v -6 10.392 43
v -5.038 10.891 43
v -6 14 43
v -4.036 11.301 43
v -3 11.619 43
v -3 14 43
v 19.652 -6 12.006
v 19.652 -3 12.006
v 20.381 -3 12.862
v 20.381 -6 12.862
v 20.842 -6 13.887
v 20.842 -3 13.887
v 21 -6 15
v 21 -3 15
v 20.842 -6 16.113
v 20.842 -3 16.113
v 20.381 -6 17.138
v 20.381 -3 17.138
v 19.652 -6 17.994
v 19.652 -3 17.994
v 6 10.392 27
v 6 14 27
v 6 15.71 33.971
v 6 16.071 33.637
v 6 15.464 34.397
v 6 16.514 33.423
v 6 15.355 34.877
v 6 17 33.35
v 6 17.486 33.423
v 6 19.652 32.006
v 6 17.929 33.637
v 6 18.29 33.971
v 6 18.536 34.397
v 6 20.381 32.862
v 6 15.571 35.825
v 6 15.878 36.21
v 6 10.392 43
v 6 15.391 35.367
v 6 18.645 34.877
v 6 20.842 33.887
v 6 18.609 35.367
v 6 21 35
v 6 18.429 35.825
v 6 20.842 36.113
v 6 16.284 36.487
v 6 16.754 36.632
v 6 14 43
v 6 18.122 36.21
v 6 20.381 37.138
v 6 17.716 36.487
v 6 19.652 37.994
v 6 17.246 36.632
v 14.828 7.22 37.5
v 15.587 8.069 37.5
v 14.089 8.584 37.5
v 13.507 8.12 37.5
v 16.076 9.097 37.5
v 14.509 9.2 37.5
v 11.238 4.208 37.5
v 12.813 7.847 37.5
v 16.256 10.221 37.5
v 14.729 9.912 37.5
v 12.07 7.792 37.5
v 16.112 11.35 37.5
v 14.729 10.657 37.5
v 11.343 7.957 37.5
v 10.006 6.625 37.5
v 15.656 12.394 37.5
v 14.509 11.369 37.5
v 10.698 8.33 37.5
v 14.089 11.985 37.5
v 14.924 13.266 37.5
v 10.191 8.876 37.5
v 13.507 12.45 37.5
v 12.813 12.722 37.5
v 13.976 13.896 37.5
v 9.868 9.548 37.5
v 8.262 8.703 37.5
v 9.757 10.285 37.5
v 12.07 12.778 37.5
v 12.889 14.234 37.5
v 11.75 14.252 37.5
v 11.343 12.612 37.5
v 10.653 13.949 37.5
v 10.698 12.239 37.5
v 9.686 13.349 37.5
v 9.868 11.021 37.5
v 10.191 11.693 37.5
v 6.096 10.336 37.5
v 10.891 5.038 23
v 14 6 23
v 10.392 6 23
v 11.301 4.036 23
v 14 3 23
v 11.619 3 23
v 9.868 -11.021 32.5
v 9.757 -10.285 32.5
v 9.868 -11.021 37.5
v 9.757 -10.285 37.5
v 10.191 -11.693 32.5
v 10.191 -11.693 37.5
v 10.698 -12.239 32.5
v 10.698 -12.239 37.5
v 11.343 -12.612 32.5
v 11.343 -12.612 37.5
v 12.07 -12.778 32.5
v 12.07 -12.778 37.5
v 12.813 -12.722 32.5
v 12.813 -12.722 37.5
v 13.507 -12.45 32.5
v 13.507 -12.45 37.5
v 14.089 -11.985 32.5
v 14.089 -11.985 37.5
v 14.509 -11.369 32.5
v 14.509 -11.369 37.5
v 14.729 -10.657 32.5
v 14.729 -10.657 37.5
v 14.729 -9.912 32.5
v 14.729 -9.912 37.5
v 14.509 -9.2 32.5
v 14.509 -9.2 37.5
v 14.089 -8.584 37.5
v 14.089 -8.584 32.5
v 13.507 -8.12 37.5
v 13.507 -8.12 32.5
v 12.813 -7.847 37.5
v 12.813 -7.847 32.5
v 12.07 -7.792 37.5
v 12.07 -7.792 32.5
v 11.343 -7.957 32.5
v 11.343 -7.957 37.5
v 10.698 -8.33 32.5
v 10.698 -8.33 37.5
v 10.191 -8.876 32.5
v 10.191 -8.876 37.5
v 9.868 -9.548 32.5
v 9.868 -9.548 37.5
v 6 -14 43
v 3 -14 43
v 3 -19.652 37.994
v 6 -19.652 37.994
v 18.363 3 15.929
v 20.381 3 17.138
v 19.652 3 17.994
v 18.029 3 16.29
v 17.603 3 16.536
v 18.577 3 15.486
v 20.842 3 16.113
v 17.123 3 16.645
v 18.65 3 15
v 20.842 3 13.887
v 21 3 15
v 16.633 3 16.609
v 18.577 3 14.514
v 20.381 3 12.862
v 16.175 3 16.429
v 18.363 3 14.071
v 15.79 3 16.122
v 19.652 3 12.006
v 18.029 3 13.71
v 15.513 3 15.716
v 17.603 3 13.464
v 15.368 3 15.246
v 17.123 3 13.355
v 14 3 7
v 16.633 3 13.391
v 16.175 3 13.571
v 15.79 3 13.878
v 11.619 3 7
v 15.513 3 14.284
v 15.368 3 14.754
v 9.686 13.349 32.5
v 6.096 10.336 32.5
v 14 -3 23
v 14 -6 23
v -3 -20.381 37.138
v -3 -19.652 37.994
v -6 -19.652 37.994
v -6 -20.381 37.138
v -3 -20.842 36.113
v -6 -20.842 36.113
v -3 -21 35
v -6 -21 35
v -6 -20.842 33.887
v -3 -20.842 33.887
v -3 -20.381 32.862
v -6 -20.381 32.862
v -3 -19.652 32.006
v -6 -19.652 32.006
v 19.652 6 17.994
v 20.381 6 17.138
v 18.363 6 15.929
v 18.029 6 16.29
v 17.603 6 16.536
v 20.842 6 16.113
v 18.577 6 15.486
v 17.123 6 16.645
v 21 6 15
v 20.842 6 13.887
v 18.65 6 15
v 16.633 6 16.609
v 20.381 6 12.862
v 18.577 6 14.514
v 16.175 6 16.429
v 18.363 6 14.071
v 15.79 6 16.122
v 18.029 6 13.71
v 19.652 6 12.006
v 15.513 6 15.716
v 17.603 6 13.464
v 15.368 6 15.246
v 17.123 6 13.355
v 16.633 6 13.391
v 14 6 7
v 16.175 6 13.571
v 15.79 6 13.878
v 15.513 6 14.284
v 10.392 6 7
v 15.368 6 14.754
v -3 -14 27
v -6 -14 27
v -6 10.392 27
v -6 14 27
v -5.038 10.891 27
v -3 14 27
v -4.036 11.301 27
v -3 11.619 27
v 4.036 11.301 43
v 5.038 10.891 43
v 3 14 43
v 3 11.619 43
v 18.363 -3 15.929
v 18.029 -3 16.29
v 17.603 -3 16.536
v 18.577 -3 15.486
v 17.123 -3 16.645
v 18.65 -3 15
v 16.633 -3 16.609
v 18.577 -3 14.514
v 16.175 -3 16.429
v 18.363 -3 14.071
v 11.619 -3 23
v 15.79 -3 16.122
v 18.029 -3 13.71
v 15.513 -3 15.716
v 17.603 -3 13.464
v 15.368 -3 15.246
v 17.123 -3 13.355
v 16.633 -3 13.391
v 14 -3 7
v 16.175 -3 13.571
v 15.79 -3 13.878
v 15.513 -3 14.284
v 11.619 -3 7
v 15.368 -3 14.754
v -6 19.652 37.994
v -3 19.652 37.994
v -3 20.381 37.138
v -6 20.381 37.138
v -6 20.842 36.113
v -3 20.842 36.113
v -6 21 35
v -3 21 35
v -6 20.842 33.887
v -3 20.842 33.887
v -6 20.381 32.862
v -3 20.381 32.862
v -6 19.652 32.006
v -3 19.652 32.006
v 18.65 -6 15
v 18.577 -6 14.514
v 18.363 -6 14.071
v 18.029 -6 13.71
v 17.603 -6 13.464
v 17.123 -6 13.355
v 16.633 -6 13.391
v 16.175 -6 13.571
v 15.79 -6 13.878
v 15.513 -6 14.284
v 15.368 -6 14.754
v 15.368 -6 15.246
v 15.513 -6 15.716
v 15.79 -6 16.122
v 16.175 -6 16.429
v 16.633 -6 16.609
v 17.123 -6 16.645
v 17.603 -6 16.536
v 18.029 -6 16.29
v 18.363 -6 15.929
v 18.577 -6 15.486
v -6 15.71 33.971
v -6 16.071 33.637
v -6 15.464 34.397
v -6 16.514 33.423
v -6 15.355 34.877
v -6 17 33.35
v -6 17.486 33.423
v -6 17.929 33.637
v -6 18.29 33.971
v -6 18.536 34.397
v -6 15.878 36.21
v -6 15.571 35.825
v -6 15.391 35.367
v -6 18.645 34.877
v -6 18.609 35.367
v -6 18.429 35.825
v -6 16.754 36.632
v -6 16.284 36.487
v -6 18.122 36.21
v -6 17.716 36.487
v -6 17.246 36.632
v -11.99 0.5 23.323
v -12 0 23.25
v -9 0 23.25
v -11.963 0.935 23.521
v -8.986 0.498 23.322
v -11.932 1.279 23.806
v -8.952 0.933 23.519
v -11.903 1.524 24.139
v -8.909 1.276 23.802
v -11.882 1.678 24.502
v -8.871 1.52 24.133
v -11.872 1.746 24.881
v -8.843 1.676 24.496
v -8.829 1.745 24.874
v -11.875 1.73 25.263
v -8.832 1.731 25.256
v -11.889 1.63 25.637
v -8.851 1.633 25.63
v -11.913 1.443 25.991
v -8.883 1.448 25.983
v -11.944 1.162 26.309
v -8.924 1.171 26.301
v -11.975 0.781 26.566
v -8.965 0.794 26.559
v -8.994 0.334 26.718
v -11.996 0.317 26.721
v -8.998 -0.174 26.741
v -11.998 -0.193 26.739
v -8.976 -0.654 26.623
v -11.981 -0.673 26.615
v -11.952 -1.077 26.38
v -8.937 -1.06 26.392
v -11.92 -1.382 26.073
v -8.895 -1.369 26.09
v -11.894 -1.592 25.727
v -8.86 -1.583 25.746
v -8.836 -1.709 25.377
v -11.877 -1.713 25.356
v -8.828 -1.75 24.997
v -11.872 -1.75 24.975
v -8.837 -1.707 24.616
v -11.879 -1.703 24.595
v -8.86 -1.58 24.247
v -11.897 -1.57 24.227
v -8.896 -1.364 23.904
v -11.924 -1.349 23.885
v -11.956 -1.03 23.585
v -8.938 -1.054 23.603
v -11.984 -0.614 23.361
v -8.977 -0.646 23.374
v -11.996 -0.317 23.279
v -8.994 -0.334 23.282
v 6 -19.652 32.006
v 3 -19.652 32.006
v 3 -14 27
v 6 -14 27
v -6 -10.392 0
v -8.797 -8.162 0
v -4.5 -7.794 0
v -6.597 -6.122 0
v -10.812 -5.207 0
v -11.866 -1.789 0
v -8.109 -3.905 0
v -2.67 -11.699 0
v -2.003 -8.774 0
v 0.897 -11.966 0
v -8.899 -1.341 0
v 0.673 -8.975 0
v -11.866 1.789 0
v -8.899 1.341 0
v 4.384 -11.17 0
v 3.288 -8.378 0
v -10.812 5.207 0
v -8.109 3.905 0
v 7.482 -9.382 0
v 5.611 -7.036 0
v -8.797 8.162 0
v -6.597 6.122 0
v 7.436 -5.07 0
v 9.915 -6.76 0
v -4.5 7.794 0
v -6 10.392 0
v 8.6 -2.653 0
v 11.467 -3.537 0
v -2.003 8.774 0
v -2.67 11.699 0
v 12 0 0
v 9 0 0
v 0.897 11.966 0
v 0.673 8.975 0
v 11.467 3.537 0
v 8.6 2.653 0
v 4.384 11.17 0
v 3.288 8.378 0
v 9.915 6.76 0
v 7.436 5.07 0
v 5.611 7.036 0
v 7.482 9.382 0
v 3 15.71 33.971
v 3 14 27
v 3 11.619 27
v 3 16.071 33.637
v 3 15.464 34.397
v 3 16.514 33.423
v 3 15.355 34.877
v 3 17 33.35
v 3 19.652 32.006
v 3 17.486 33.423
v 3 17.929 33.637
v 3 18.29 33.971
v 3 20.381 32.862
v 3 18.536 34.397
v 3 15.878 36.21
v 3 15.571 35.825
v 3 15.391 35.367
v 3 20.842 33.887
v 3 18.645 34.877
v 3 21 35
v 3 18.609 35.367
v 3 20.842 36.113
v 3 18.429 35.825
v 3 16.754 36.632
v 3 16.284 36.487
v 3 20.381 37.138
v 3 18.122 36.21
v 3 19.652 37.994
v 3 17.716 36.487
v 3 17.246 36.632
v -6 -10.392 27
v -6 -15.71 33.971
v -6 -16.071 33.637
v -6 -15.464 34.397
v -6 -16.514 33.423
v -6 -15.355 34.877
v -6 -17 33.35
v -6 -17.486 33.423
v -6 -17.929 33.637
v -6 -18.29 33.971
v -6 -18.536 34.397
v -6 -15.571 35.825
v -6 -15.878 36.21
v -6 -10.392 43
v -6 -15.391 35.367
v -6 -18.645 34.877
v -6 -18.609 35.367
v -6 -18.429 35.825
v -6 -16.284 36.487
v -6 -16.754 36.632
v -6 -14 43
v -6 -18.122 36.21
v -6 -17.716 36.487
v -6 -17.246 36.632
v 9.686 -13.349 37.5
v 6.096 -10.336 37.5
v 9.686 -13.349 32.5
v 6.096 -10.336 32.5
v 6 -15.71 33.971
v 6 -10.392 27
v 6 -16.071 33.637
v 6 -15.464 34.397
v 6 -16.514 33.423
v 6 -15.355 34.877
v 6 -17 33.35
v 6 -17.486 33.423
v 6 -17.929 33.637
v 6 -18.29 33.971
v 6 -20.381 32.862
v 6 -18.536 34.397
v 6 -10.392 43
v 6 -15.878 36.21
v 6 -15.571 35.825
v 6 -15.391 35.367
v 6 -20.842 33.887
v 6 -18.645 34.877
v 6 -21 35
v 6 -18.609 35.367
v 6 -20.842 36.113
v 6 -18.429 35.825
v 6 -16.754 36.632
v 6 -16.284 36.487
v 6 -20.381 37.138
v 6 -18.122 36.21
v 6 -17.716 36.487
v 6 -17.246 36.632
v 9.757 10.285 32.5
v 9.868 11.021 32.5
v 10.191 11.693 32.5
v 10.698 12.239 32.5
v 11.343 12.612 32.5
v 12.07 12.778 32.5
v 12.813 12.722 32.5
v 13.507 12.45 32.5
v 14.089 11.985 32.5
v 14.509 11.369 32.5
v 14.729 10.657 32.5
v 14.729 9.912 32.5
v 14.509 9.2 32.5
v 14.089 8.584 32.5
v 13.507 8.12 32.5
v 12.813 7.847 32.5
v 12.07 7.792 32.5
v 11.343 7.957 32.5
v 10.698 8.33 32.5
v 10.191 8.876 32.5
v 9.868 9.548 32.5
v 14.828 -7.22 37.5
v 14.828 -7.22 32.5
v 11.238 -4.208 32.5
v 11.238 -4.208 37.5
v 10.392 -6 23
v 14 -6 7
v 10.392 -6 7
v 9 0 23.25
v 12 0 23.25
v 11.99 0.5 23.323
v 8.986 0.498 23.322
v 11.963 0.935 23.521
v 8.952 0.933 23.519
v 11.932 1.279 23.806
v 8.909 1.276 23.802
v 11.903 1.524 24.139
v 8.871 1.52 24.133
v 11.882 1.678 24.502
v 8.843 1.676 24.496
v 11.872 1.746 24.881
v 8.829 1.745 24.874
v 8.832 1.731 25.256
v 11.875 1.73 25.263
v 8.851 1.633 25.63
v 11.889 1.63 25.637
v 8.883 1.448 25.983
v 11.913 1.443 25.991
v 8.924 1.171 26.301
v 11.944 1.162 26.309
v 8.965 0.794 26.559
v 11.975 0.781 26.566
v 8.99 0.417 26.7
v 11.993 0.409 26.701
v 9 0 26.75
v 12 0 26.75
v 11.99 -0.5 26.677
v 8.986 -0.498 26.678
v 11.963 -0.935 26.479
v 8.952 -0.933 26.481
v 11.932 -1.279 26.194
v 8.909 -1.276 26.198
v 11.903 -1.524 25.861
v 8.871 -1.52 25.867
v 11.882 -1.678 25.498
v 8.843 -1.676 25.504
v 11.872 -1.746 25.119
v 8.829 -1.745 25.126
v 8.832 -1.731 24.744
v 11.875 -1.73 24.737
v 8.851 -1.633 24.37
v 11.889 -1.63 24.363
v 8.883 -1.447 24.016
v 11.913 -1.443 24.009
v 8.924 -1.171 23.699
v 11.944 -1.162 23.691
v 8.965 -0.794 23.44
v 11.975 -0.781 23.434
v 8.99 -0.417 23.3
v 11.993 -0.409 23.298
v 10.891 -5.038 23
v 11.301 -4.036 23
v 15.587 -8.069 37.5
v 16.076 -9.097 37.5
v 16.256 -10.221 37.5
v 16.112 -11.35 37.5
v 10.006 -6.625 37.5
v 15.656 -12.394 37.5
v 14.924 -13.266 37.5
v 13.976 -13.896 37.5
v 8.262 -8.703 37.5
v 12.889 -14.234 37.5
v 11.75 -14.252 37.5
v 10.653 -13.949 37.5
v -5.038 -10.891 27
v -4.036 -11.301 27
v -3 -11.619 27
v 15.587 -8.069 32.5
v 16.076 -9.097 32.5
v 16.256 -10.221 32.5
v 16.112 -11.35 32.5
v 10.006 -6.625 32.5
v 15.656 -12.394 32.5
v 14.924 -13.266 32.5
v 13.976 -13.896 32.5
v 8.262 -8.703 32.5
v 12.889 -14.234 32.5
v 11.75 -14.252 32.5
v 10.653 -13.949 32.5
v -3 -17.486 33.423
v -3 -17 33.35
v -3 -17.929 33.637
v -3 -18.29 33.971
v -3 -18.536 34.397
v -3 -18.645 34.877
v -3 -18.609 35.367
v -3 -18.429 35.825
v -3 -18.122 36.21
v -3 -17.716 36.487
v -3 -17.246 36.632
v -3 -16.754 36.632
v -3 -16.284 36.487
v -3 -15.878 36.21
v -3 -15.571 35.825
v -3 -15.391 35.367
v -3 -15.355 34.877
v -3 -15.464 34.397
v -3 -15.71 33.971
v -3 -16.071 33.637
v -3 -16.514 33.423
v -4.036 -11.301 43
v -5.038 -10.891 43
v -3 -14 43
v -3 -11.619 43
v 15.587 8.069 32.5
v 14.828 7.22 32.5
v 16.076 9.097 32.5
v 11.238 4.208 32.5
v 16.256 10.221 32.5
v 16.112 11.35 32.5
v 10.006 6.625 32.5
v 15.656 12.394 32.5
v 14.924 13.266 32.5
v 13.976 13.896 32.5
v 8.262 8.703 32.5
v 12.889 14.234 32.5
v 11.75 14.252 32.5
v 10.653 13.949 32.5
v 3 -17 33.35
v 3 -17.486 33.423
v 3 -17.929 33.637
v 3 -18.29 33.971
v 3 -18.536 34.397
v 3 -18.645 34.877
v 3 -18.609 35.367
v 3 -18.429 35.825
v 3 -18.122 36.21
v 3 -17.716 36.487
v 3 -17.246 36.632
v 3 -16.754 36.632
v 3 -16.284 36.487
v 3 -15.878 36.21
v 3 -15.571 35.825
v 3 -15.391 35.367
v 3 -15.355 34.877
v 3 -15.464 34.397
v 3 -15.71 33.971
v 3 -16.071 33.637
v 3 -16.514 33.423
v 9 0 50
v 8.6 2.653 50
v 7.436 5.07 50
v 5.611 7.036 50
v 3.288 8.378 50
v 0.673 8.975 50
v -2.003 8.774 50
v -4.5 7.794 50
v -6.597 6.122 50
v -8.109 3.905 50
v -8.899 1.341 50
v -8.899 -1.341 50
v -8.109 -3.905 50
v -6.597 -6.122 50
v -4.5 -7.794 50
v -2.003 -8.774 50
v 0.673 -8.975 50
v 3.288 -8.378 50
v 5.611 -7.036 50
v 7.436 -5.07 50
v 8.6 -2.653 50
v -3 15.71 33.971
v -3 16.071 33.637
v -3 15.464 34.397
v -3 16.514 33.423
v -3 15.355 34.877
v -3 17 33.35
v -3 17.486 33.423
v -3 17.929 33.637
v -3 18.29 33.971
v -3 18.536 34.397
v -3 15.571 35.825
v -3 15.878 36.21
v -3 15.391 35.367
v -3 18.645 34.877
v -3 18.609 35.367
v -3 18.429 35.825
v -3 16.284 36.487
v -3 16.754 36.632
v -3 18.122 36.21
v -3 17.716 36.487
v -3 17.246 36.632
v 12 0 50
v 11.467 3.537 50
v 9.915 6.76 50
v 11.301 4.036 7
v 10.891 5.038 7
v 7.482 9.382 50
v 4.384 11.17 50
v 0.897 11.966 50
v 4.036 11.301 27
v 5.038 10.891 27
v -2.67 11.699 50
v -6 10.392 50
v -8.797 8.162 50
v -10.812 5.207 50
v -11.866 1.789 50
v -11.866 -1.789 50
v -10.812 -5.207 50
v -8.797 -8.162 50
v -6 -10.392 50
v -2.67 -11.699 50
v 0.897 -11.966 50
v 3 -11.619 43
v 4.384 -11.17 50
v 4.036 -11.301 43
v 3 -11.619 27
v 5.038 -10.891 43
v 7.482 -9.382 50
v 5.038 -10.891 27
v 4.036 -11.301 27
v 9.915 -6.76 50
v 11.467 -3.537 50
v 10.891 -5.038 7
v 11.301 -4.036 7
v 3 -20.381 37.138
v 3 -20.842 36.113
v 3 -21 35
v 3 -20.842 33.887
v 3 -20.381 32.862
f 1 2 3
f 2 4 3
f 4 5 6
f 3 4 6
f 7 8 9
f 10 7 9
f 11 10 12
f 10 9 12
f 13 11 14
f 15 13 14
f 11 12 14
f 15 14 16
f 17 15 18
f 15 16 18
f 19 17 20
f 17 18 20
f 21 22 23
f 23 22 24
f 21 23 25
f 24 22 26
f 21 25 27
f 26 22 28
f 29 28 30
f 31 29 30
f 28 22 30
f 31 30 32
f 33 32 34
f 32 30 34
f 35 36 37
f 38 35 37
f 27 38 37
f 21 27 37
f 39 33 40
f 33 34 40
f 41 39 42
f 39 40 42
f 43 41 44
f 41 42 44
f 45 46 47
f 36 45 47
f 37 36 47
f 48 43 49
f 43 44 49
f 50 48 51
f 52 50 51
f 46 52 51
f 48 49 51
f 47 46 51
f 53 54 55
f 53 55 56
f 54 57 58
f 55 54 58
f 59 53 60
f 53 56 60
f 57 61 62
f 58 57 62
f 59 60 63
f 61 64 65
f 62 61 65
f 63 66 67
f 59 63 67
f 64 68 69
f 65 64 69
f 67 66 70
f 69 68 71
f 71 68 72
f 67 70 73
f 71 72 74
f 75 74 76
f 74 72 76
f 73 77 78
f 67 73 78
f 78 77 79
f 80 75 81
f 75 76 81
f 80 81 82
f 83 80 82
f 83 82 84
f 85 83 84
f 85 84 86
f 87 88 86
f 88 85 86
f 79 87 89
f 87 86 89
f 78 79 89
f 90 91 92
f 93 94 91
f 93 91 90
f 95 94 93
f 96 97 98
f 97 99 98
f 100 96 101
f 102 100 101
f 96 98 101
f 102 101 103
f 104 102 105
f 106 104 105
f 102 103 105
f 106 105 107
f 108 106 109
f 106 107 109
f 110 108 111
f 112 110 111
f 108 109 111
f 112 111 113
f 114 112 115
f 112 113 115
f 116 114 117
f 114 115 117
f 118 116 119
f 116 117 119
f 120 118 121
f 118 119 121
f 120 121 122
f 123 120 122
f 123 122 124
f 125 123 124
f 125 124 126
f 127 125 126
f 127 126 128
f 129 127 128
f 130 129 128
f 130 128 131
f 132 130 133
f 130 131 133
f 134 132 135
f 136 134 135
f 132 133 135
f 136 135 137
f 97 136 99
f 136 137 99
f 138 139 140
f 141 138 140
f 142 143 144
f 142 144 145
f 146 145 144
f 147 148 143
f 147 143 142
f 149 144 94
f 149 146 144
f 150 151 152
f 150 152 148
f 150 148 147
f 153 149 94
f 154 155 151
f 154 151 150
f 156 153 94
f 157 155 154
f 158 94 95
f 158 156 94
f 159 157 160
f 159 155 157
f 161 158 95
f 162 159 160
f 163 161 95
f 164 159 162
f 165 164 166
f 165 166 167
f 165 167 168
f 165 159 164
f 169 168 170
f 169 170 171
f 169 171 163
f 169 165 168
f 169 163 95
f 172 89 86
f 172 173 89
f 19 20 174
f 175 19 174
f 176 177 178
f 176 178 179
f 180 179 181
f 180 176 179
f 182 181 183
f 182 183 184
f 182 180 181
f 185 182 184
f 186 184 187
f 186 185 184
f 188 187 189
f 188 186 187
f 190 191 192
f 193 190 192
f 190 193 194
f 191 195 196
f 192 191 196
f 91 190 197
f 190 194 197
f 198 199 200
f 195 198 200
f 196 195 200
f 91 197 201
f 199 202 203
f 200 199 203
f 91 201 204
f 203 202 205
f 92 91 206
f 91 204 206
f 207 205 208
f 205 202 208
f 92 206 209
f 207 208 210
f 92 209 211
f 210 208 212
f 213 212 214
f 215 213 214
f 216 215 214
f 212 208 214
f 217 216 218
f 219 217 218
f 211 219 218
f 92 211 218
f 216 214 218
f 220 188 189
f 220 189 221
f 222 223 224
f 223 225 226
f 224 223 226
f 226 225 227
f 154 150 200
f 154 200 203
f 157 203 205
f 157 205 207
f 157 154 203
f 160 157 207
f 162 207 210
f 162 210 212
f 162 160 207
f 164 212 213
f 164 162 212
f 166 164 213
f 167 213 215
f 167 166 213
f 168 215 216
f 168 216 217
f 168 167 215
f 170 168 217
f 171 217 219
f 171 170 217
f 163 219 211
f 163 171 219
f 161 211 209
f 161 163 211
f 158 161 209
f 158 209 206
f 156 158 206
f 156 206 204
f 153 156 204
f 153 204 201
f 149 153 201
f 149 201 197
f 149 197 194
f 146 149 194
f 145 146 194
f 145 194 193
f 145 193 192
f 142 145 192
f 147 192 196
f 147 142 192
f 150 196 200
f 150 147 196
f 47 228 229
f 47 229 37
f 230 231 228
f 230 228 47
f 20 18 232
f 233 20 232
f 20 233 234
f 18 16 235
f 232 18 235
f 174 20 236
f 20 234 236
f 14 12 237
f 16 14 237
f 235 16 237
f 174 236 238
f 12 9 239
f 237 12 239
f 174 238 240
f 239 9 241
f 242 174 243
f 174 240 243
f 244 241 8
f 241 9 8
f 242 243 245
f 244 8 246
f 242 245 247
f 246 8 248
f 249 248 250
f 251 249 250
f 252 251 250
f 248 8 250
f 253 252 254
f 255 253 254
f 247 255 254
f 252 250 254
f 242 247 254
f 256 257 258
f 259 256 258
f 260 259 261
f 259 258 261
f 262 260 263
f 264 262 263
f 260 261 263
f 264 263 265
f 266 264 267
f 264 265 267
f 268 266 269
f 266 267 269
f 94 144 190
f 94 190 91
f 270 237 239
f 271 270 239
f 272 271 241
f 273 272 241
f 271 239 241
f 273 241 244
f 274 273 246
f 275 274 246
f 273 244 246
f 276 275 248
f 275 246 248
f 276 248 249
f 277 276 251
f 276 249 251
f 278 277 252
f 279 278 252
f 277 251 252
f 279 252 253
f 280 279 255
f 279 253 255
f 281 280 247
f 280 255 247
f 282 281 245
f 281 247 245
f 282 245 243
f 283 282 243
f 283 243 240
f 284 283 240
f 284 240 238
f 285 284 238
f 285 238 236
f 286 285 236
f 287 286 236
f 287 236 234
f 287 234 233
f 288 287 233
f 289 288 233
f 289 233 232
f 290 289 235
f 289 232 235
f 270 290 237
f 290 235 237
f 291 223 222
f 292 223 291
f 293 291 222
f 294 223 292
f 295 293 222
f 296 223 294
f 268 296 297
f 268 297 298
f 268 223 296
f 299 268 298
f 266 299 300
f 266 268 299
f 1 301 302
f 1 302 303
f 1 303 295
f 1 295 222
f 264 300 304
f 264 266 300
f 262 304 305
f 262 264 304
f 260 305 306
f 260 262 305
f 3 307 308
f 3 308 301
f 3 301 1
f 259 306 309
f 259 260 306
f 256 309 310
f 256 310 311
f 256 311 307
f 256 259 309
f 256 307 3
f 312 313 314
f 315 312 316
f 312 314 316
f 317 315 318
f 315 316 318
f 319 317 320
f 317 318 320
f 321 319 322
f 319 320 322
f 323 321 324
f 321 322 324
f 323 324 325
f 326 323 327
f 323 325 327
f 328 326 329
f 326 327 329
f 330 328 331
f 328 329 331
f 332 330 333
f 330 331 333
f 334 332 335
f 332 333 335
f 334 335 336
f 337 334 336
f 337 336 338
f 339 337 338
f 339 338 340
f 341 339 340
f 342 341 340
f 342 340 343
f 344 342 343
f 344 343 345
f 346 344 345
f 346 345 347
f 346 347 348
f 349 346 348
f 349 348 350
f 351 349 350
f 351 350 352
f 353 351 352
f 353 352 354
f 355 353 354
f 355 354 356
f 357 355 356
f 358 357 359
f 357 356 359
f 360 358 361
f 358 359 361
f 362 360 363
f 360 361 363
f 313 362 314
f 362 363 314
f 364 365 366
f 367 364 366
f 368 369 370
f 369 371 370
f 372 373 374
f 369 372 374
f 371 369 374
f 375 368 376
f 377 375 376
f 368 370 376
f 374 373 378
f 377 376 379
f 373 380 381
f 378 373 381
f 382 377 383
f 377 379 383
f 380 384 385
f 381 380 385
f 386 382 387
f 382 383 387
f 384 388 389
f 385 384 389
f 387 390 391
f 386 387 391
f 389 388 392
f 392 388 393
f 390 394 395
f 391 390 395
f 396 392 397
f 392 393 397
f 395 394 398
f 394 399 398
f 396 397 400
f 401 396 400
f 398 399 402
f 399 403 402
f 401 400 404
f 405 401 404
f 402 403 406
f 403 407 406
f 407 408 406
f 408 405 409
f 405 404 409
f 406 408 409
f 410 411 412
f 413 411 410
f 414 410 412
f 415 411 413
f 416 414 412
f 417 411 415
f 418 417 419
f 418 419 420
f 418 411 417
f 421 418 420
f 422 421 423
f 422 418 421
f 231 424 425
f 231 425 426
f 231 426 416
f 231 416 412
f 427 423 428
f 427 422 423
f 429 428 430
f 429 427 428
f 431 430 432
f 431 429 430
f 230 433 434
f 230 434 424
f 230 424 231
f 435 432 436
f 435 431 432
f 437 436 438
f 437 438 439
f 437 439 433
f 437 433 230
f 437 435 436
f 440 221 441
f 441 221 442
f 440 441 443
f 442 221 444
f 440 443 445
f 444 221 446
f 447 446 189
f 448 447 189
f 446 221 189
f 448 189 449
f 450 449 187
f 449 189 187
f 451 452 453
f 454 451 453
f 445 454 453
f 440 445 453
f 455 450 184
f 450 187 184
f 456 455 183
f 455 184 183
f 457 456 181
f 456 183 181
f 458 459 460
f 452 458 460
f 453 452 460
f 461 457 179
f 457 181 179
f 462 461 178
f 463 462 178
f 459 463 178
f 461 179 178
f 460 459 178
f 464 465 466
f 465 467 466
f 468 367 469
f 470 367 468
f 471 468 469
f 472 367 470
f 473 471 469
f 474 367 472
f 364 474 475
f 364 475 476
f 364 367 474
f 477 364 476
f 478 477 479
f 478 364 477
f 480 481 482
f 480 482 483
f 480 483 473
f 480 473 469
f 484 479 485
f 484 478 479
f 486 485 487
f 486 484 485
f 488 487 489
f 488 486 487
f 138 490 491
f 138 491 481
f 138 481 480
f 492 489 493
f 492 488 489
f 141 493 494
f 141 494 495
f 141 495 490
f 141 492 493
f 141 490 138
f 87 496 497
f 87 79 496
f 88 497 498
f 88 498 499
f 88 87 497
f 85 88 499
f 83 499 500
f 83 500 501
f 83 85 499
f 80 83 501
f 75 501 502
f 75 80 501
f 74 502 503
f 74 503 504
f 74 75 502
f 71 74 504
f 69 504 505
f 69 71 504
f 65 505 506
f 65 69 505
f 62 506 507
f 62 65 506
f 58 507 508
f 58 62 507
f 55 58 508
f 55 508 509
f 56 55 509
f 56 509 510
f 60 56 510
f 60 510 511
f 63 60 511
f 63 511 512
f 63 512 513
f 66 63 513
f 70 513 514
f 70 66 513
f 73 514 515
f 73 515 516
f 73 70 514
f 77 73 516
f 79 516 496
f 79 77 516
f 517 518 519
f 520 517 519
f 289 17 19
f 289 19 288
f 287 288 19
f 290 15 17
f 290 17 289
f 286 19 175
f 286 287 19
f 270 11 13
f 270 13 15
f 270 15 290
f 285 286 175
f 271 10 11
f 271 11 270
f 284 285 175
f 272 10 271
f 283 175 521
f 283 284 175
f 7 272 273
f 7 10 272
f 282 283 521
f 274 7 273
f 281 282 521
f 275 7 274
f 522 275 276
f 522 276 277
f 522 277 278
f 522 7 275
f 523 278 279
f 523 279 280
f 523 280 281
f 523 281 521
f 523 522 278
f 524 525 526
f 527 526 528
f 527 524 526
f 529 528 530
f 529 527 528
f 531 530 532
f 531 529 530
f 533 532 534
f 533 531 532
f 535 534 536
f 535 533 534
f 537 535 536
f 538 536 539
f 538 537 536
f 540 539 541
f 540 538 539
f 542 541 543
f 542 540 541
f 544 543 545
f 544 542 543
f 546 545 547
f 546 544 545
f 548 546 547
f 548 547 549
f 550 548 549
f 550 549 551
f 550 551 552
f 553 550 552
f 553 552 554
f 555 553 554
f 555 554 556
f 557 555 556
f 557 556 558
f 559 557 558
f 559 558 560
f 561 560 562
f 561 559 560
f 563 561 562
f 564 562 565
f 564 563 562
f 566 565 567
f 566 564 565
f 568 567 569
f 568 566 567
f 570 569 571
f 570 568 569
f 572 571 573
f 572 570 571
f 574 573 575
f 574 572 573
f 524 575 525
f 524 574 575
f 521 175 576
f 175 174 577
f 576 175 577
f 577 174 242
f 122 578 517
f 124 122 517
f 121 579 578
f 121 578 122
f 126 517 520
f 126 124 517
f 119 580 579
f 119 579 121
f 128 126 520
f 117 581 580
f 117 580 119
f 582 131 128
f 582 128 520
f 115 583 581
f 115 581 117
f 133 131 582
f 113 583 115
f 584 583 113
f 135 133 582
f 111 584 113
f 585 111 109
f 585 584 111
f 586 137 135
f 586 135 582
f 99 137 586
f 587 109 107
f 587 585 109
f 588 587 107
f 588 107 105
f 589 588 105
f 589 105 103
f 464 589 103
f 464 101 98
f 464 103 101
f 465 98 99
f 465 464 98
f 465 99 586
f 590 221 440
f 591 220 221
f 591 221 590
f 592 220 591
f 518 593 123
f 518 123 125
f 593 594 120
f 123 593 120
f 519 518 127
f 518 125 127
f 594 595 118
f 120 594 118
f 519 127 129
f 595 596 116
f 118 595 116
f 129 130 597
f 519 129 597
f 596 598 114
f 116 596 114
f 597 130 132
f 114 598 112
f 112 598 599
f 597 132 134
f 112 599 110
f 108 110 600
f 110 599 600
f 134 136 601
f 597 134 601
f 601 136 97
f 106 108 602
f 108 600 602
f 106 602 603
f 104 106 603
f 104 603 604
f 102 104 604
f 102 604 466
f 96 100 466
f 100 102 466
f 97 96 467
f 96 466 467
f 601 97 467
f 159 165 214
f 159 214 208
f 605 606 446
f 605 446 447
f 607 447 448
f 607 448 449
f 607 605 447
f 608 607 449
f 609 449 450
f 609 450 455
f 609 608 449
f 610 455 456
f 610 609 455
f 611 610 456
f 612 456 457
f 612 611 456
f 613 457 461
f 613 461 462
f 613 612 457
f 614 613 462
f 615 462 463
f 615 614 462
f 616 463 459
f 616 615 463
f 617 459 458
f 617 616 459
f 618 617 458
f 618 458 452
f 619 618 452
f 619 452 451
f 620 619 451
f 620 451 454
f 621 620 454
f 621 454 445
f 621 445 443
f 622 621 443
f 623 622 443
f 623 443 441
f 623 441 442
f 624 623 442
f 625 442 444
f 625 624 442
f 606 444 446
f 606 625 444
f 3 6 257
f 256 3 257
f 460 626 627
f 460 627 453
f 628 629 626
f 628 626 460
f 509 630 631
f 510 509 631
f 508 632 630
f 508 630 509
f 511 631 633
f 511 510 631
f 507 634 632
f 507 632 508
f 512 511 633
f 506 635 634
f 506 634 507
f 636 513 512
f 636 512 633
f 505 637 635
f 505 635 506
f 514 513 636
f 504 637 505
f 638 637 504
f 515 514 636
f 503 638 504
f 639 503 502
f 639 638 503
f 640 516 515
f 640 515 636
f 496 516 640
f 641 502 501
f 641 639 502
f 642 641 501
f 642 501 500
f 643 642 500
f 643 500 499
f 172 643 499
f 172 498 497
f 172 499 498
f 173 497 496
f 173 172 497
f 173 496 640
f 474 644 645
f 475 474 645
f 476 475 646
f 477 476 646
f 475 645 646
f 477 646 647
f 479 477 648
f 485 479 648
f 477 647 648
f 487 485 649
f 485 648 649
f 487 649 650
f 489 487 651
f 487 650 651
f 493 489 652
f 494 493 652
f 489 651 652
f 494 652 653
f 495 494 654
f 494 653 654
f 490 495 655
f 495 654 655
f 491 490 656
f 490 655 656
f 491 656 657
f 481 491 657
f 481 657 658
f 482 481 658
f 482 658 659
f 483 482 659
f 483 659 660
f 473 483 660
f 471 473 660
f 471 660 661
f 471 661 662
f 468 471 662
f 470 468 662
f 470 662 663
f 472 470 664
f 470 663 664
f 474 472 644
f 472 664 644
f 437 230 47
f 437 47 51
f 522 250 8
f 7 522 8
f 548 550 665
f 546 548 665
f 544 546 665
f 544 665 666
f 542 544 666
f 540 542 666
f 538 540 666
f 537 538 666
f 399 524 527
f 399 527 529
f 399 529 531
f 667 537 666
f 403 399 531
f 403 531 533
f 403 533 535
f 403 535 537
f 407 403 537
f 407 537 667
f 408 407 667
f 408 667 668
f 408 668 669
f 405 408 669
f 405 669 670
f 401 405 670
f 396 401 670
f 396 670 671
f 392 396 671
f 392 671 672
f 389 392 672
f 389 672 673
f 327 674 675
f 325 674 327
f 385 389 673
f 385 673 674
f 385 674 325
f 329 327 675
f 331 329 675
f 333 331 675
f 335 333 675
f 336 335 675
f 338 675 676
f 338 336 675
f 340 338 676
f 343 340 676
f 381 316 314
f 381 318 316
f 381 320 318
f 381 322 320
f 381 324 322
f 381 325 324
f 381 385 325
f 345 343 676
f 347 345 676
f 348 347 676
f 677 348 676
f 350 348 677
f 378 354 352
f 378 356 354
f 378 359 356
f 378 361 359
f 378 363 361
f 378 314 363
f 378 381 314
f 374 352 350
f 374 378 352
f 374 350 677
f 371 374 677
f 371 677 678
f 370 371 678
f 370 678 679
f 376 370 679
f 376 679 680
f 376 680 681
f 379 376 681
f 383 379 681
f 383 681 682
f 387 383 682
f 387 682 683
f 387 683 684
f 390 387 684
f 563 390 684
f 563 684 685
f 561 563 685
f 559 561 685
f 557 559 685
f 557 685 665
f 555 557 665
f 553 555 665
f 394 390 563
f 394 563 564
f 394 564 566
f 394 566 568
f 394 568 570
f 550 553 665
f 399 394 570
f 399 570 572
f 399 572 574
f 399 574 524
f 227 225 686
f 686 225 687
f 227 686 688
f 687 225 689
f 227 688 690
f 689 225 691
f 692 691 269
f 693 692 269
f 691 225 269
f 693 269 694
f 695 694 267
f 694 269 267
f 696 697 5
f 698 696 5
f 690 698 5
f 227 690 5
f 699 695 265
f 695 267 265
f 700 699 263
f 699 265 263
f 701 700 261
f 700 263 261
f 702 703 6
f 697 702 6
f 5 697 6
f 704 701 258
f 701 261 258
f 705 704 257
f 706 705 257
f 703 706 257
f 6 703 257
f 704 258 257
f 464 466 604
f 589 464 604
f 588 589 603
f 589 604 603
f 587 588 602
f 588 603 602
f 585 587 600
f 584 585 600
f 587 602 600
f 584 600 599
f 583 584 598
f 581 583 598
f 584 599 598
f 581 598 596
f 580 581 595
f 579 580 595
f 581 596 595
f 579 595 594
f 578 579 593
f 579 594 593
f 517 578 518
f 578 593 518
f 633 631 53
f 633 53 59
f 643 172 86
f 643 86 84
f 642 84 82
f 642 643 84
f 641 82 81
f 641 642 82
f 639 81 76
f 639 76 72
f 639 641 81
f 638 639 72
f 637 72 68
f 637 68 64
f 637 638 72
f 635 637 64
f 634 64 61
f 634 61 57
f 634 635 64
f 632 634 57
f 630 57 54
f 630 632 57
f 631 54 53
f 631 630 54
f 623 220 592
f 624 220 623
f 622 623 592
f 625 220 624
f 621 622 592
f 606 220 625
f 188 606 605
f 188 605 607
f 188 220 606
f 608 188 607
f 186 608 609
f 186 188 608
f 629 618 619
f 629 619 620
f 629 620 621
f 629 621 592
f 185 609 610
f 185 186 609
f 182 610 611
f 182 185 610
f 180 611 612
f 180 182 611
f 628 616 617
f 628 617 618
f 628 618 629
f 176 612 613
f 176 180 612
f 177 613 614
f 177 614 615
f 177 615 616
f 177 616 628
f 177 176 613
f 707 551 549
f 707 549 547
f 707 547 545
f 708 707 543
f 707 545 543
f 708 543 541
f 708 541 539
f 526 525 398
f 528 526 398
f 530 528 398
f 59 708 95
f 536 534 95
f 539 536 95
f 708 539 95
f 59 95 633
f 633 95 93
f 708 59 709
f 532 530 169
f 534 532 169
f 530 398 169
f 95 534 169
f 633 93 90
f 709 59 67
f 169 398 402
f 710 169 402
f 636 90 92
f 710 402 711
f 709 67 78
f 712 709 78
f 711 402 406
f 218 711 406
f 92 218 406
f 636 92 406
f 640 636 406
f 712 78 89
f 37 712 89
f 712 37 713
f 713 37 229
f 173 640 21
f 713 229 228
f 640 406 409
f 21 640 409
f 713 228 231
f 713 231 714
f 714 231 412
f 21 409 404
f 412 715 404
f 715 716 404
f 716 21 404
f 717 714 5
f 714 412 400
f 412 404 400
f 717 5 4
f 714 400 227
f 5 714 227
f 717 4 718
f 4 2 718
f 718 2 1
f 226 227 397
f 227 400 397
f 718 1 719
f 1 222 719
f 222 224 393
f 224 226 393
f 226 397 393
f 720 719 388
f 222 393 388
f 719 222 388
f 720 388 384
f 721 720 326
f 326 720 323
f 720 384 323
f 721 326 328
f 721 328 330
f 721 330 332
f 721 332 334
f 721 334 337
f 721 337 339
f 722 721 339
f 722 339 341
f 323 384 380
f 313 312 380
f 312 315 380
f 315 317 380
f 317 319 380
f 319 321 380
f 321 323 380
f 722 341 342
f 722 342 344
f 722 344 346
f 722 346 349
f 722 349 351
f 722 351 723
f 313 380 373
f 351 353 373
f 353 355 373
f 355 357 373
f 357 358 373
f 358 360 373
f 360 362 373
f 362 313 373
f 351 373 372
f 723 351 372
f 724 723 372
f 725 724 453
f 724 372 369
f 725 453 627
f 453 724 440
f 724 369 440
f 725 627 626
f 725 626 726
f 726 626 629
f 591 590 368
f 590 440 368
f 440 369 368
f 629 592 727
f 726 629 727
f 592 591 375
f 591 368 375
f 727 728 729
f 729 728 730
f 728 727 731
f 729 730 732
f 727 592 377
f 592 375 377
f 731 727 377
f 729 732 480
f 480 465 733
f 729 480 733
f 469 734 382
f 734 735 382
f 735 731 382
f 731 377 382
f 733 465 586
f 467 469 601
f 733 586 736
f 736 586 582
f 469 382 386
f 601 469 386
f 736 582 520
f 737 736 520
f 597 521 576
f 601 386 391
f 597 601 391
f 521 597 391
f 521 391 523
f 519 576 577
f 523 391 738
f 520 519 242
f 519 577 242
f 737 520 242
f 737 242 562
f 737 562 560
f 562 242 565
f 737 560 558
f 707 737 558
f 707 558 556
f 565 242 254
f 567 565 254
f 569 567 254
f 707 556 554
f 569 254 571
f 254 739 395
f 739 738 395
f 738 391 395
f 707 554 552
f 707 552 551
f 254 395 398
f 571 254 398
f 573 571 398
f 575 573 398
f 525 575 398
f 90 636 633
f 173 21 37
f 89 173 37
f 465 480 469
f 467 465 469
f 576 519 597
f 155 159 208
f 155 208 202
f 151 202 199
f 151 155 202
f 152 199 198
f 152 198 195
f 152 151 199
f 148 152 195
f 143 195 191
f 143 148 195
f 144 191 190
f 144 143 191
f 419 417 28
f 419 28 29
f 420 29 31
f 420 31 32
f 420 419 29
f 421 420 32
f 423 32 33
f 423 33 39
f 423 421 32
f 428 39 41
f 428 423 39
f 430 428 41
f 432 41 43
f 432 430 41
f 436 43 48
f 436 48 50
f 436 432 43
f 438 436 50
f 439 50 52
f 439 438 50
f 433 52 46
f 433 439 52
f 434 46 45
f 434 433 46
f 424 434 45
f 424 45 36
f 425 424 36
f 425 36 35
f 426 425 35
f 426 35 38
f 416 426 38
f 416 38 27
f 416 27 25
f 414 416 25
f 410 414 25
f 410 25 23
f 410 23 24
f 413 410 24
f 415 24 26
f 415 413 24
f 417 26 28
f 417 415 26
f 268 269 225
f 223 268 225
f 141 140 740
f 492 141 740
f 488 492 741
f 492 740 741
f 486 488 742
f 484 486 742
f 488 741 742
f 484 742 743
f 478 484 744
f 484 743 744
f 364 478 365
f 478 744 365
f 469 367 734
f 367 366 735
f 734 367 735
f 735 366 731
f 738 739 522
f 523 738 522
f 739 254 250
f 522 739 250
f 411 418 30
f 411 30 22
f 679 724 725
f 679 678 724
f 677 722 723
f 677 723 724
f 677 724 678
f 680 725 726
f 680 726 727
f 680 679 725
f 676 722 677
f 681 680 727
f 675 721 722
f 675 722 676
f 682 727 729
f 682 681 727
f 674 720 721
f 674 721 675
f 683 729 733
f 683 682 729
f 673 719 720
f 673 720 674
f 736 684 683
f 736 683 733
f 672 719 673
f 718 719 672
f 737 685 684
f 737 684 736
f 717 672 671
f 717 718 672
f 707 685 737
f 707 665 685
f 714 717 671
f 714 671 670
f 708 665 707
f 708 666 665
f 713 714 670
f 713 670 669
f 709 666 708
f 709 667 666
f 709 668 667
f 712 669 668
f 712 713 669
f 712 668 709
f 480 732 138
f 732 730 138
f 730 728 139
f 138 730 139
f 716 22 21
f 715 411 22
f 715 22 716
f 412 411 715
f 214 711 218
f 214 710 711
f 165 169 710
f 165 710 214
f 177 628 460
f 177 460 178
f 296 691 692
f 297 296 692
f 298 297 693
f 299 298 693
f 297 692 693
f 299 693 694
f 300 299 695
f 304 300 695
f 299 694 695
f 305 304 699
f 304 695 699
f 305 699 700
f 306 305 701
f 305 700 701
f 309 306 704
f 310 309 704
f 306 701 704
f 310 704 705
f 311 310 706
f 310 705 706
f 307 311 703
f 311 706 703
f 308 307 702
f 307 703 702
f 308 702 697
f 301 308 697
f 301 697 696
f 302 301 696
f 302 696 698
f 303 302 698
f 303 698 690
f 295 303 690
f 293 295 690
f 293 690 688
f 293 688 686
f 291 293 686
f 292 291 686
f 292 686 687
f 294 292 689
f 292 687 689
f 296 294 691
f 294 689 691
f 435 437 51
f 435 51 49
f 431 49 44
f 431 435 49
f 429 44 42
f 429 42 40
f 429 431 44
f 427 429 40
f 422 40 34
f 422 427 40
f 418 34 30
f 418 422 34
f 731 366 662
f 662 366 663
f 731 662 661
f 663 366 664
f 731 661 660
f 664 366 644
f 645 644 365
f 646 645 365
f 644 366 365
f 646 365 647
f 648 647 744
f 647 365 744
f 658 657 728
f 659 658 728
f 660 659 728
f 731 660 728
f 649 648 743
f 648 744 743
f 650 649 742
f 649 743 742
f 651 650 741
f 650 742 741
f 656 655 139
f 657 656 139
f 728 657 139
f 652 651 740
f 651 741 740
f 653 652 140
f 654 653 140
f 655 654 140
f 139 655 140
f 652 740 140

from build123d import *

# Parameters (mm, degrees)
SKETCH_1_R               = 12
SKETCH_1_R_2             = 9
EXTRUDE_1_DEPTH          = 50
SKETCH_2_R               = 1.65
EXTRUDE_2_DEPTH          = 3
SKETCH_3_R               = 1.75
CUT_EXTRUDE_1_DEPTH      = 13
CUT_EXTRUDE_1_DEPTH_BACK = 13
MIRROR_2_COPY_1_SKETCH_R = 1.65
MIRROR_2_COPY_1_DEPTH    = 3
SKETCH_5_R               = 1.65
EXTRUDE_3_DEPTH          = 3
SKETCH_6_R               = 2.5
EXTRUDE_4_DEPTH          = 2.5


with BuildPart() as part:
    # ｽｹｯﾁ1 → ﾎﾞｽ - 押し出し1 (new body)
    with BuildSketch(Plane.XY):
        Circle(SKETCH_1_R)
        Circle(SKETCH_1_R_2, mode=Mode.SUBTRACT)
    extrude(amount=EXTRUDE_1_DEPTH)

    # ｽｹｯﾁ2 → ﾎﾞｽ - 押し出し2 (add)
    with BuildSketch(Plane(origin=(3, 0, 0), x_dir=(0, 0, -1), z_dir=(1, 0, 0))):
        with BuildLine():
            Line((-43, 9), (-43, 14))
            Line((-43, 14), (-37.994493332, 19.651982218))
            ThreePointArc((-37.994493332, 19.651982218), (-35, 21), (-32.005506668, 19.651982218))
            Line((-32.005506668, 19.651982218), (-27, 14))
            Line((-27, 14), (-27, 9))
            Line((-27, 9), (-43, 9))
        make_face()
        with Locations((-35, 17)):
            Circle(SKETCH_2_R, mode=Mode.SUBTRACT)
    extrude_2 = extrude(amount=EXTRUDE_2_DEPTH)

    # ﾐﾗｰ1: ﾎﾞｽ - 押し出し2 across plane
    add(extrude_2.mirror(Plane(origin=(0, 0, 0), x_dir=(0, 0, 1), z_dir=(1, 0, 0))))

    # ｽｹｯﾁ3 → ｶｯﾄ - 押し出し1 (cut, two sides)
    with BuildSketch(Plane(origin=(0, 0, 0), x_dir=(0, 0, -1), z_dir=(1, 0, 0))) as cut_extrude_1_sk:
        with Locations((-25, 0)):
            Circle(SKETCH_3_R)
    extrude(amount=CUT_EXTRUDE_1_DEPTH, mode=Mode.SUBTRACT)
    extrude(cut_extrude_1_sk.sketch, amount=-CUT_EXTRUDE_1_DEPTH_BACK, mode=Mode.SUBTRACT)

    # ﾐﾗｰ2: ﾎﾞｽ - 押し出し2 across plane
    add(extrude_2.mirror(Plane.ZX))

    # ﾐﾗｰ2 copy 1 sketch → ﾐﾗｰ2 copy 1 (add)
    with BuildSketch(Plane(origin=(-3, 0, 0), x_dir=(0, 0, -1), z_dir=(-1, 0, 0))):
        with BuildLine():
            Line((-43, 9), (-43, 14))
            Line((-43, 14), (-37.994493332, 19.651982218))
            ThreePointArc((-37.994493332, 19.651982218), (-35, 21), (-32.005506668, 19.651982218))
            Line((-32.005506668, 19.651982218), (-27, 14))
            Line((-27, 14), (-27, 9))
            Line((-27, 9), (-43, 9))
        make_face()
        with Locations((-35, 17)):
            Circle(MIRROR_2_COPY_1_SKETCH_R, mode=Mode.SUBTRACT)
    extrude(amount=MIRROR_2_COPY_1_DEPTH)

    # ｽｹｯﾁ5 → ﾎﾞｽ - 押し出し3 (add)
    with BuildSketch(Plane(origin=(0, 3, 0), x_dir=(1, 0, 0), z_dir=(0, 1, 0))):
        with BuildLine():
            Line((9, -7), (14, -7))
            Line((14, -7), (19.651982218, -12.005506668))
            ThreePointArc((19.651982218, -12.005506668), (21, -15), (19.651982218, -17.994493332))
            Line((19.651982218, -17.994493332), (14, -23))
            Line((14, -23), (9, -23))
            Line((9, -23), (9, -7))
        make_face()
        with Locations((17, -15)):
            Circle(SKETCH_5_R, mode=Mode.SUBTRACT)
    extrude_3 = extrude(amount=EXTRUDE_3_DEPTH)

    # ﾐﾗｰ3: ﾎﾞｽ - 押し出し3 across plane
    add(extrude_3.mirror(Plane.ZX))

    # ｽｹｯﾁ6 → ﾎﾞｽ - 押し出し4 (add, symmetric)
    with BuildSketch(Plane(origin=(0, 0, 35), x_dir=(-1, 0, 0), z_dir=(0, 0, -1))):
        with BuildLine():
            Line((-6.095653088, 10.336489415), (-9.685560651, 13.348779527))
            ThreePointArc((-9.685560651, 13.348779527), (-15.320888862, 12.855752194), (-14.827861529, 7.220423983))
            Line((-14.827861529, 7.220423983), (-11.237953965, 4.20813387))
            Line((-11.237953965, 4.20813387), (-6.095653088, 10.336489415))
        make_face()
        with Locations((-12.25671109, 10.284601755)):
            Circle(SKETCH_6_R, mode=Mode.SUBTRACT)
    extrude_4 = extrude(amount=EXTRUDE_4_DEPTH, both=True)

    # ﾐﾗｰ4: ﾎﾞｽ - 押し出し4 across plane
    add(extrude_4.mirror(Plane.ZX))


solid = part.part
